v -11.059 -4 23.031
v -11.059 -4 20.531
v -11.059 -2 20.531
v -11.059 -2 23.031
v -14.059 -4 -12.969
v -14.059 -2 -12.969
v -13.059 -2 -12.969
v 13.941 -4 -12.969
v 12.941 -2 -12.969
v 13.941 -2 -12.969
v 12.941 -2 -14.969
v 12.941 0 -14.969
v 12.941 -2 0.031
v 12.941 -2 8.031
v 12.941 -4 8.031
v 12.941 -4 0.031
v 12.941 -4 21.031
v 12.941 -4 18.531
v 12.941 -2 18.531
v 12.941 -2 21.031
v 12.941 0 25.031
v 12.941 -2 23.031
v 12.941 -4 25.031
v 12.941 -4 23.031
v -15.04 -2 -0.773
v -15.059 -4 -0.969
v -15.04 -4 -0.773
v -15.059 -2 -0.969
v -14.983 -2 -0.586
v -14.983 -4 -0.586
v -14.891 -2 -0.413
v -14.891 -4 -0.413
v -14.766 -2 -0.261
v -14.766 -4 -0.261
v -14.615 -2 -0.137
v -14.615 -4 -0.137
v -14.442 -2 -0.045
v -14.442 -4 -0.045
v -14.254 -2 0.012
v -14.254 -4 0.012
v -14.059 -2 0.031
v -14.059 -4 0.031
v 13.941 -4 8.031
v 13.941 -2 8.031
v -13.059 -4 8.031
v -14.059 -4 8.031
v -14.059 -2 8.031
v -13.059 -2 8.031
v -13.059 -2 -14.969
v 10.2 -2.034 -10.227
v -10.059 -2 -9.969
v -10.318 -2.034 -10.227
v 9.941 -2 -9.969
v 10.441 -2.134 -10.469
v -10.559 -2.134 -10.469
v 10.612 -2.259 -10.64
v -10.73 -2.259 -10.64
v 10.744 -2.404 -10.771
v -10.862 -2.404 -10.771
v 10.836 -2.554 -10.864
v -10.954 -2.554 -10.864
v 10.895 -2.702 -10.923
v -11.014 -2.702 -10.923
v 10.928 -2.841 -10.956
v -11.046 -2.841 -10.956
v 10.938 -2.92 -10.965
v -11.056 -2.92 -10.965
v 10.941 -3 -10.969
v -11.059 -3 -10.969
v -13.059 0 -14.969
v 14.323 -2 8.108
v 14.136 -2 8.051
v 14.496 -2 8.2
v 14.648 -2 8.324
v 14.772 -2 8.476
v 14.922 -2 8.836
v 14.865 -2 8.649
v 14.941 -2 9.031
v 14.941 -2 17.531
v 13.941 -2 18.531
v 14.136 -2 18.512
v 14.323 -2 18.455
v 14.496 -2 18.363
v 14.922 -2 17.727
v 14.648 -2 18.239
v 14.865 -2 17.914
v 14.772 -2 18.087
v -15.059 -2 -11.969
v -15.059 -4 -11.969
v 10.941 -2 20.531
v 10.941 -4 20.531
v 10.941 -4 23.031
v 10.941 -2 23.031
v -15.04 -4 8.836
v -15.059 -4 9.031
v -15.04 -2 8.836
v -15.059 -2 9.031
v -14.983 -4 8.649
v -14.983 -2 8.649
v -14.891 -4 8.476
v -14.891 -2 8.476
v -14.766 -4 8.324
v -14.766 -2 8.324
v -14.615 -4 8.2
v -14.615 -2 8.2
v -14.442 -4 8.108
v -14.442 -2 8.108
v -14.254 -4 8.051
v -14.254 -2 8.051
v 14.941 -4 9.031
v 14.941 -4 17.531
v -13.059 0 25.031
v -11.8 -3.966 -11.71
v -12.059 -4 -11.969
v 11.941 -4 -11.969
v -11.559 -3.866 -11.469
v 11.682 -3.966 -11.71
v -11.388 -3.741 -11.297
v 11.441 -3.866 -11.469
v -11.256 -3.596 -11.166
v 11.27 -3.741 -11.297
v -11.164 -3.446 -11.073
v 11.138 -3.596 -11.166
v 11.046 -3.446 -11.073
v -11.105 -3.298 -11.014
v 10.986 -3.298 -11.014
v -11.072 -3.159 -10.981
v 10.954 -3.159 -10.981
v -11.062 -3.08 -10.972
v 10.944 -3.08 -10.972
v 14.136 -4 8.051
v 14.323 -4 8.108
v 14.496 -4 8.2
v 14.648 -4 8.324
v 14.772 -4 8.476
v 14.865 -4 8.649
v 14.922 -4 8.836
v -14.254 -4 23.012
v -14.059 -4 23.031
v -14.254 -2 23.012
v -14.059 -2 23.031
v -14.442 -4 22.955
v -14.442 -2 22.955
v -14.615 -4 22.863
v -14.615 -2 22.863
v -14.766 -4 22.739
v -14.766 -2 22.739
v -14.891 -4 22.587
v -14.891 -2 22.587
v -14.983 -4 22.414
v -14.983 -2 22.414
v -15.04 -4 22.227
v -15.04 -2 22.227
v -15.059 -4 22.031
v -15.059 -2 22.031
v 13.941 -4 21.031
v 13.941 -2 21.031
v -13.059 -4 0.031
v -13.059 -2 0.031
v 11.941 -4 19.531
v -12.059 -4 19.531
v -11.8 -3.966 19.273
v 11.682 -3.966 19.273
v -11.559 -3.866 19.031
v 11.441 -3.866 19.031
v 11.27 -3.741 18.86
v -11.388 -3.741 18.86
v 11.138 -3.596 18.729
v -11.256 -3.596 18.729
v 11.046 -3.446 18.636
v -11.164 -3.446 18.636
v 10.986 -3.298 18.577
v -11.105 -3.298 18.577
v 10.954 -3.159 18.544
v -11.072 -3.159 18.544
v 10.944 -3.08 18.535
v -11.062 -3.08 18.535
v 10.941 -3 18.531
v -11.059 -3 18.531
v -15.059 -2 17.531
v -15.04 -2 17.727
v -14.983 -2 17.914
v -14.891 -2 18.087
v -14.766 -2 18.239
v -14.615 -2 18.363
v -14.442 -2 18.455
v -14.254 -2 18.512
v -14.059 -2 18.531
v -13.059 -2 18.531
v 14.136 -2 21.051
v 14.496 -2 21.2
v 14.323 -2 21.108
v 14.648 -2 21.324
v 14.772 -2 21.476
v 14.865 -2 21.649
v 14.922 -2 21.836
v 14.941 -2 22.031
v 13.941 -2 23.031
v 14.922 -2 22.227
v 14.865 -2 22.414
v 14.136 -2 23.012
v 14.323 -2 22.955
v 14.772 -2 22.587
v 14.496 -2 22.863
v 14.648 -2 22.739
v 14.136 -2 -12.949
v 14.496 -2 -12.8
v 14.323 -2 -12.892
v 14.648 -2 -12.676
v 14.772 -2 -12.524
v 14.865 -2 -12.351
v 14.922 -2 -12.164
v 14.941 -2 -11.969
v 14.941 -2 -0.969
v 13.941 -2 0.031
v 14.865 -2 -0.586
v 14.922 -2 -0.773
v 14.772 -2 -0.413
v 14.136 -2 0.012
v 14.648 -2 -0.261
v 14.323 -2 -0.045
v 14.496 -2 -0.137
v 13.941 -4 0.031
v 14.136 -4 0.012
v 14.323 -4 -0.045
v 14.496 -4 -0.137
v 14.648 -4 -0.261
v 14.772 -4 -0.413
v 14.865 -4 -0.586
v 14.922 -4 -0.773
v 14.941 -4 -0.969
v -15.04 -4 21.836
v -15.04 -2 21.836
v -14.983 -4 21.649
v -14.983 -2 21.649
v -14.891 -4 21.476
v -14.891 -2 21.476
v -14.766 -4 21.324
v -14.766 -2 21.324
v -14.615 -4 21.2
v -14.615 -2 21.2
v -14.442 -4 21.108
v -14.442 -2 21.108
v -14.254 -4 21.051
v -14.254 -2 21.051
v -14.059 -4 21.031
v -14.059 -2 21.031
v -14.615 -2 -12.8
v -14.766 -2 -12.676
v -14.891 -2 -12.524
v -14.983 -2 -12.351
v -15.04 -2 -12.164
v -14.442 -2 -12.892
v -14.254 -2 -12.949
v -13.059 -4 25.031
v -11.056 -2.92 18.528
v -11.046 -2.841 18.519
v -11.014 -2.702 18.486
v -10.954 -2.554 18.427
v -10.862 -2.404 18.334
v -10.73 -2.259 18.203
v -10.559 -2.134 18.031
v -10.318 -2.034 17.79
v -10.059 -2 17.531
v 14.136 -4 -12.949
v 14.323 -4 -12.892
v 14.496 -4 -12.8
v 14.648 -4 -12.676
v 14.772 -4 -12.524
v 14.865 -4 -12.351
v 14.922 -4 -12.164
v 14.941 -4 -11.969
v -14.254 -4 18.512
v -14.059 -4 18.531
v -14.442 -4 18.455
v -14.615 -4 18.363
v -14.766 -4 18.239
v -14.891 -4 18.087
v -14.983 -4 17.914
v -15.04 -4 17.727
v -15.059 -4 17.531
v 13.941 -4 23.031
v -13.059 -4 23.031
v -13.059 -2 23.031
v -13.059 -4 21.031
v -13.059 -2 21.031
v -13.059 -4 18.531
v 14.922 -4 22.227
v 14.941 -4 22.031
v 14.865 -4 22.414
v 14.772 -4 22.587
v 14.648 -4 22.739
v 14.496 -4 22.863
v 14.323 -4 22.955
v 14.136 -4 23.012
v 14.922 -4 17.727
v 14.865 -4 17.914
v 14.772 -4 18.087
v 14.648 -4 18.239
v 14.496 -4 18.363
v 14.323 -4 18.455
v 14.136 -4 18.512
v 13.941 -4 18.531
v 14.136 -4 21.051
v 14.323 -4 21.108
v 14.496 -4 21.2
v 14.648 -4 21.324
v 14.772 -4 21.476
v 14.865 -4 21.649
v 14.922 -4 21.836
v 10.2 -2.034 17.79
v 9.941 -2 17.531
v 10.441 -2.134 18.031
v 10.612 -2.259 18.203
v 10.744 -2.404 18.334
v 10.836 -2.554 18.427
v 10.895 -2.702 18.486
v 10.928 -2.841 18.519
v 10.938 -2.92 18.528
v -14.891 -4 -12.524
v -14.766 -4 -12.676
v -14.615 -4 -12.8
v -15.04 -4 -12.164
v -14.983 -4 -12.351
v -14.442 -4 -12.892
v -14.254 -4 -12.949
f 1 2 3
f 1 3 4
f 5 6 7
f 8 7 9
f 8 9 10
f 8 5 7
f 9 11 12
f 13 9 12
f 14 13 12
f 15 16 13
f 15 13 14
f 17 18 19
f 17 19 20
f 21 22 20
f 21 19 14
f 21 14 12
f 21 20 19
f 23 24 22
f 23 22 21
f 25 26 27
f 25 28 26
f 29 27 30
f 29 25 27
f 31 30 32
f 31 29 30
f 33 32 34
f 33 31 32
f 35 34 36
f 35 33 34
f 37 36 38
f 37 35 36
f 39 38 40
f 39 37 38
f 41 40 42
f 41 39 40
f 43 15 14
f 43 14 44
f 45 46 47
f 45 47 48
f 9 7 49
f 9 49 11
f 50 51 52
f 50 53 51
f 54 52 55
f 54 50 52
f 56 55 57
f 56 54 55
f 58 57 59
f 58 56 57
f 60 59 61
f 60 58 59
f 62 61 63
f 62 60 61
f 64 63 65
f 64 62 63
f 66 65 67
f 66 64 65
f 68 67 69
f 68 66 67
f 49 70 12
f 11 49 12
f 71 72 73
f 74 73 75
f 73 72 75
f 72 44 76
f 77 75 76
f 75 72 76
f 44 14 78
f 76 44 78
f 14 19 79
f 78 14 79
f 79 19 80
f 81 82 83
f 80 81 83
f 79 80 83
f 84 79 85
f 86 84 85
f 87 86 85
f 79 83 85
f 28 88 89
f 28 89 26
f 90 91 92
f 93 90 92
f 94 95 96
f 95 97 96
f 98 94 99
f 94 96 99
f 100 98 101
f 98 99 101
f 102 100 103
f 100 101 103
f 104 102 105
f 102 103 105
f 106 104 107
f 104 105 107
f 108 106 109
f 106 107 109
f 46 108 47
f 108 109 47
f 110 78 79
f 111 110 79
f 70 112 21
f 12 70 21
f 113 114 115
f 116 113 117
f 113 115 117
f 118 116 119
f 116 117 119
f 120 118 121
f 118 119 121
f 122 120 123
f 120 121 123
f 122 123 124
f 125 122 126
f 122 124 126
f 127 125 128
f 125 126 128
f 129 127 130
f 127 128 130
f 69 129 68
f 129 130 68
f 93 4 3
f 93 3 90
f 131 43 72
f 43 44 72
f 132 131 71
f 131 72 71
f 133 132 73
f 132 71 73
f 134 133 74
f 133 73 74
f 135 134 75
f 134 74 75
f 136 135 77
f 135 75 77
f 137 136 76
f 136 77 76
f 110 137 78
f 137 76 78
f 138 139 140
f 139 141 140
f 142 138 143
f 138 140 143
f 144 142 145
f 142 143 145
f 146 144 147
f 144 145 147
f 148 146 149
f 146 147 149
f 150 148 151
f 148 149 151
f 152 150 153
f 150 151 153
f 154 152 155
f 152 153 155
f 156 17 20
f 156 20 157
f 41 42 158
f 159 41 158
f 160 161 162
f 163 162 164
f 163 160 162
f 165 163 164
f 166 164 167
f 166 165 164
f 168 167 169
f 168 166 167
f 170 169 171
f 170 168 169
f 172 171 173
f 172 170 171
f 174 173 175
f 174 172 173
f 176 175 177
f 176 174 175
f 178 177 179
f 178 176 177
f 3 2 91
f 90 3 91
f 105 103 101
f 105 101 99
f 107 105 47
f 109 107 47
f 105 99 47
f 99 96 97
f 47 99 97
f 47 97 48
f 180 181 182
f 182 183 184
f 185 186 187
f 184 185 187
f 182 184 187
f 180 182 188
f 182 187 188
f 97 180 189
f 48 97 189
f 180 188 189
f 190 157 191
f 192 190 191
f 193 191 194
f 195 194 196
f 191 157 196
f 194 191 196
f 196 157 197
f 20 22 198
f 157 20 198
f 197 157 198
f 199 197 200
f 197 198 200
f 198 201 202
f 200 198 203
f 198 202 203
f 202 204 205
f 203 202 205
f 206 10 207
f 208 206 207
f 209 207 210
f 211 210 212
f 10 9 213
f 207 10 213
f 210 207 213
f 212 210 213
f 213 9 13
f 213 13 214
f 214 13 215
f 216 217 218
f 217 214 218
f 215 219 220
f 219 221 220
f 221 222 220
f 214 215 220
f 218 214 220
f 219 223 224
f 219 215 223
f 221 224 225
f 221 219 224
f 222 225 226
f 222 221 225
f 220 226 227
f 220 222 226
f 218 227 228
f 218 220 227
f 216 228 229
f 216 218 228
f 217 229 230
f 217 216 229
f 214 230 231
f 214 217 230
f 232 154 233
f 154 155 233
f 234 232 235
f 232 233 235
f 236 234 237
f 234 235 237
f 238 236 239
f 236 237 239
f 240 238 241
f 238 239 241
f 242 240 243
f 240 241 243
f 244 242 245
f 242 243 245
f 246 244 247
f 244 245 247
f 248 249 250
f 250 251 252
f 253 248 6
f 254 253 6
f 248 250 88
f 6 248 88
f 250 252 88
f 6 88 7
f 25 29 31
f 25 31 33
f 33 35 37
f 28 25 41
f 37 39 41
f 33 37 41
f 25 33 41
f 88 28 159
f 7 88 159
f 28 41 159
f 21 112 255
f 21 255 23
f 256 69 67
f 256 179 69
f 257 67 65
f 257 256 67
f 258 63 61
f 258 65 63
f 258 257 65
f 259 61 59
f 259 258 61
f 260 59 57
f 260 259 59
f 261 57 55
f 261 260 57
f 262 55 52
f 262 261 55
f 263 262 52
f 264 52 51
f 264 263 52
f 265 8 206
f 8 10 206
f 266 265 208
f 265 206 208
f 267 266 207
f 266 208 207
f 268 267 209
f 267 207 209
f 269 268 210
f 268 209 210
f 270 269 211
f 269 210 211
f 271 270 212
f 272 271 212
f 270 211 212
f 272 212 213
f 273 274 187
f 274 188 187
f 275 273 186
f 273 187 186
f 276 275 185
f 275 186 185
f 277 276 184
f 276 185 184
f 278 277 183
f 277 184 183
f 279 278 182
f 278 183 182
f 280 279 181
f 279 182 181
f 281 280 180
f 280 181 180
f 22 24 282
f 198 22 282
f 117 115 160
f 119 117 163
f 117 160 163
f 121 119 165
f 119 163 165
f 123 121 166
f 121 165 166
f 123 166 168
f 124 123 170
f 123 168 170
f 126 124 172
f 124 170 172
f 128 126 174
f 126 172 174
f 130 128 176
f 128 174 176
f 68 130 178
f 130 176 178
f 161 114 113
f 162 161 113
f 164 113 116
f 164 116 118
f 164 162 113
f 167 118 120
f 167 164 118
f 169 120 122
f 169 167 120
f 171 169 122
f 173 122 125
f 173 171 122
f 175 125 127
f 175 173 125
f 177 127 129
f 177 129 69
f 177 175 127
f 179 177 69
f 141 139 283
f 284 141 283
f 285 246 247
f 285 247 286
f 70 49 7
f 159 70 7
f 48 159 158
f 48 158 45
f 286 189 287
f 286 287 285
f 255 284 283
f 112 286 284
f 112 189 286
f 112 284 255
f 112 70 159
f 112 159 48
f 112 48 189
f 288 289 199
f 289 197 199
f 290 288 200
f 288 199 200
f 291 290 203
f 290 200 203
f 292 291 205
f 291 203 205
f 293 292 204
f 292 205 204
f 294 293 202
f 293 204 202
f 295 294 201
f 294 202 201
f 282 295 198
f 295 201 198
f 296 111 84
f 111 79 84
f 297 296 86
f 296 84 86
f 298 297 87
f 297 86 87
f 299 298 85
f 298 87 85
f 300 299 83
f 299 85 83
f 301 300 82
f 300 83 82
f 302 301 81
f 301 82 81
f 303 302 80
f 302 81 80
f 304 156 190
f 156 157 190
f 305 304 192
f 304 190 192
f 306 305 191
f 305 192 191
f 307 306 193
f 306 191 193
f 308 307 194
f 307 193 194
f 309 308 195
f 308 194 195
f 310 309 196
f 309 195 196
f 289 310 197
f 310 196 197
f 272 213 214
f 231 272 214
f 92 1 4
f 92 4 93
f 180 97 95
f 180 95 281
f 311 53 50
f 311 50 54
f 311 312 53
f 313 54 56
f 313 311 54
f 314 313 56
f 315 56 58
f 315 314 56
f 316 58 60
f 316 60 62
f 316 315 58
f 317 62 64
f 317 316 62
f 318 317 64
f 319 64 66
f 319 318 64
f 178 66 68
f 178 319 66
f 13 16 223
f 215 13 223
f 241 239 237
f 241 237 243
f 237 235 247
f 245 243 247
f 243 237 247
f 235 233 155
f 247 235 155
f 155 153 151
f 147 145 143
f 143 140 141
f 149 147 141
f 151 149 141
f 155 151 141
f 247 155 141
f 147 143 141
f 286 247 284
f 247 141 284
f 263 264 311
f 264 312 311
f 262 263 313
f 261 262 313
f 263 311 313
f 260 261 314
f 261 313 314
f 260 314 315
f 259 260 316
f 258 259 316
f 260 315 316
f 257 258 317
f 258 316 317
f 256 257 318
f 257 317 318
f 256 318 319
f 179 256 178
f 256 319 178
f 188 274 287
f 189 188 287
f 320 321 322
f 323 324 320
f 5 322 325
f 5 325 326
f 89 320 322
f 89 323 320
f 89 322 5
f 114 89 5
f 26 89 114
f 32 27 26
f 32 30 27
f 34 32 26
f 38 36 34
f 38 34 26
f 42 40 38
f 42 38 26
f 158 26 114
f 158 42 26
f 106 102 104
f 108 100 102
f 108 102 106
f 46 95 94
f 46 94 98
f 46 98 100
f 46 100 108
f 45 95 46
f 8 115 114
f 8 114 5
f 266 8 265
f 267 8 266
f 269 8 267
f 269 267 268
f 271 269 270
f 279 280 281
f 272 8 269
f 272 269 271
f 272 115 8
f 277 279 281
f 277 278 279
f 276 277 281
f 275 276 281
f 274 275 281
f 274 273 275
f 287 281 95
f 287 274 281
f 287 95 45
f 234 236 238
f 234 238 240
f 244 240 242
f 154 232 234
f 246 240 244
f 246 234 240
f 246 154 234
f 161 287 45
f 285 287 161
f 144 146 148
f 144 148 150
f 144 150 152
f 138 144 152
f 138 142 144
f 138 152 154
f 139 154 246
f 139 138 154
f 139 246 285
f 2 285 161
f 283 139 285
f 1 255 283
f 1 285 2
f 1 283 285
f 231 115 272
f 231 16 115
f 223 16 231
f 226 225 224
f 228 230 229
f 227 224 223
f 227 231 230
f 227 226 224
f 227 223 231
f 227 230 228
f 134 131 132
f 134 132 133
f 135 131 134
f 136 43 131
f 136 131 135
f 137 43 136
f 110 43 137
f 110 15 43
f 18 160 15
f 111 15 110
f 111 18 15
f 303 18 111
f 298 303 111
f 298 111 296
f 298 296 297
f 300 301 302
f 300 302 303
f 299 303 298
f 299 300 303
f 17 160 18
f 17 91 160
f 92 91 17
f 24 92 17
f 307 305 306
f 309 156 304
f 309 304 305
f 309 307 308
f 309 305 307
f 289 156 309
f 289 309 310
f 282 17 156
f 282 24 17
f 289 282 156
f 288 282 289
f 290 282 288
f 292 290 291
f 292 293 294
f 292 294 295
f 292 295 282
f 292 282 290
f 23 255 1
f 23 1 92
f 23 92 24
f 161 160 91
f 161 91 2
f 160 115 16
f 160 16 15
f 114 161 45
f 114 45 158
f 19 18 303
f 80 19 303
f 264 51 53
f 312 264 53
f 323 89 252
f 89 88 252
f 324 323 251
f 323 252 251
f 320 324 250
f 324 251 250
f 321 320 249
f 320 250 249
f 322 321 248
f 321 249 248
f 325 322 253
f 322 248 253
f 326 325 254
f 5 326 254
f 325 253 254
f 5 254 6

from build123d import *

# Parameters (mm, degrees)
F0_W     = 26
F0_H     = 40
F1_DEPTH = 2
F2_W     = 30
F2_H     = 40
F3_DEPTH = 2
F4_W     = 2
F4_H     = 2
F4_H_2   = 2.5
F4_W_2   = 30
F4_W_3   = 22
F4_H_3   = 8
F4_H_4   = 29.5
F5_DEPTH = 2
F6_R     = 0.99999


# Not quite as in the source:
# - a fillet or chamfer is up to 0.001 mm smaller than in the source, because OpenCascade refuses the exact size


with BuildPart() as f1:
    # F0 (on Front) → F1 (new body)
    with BuildSketch(Plane.XZ):
        with Locations((-0.059209764, 5.0314570961)):
            Rectangle(F0_W, F0_H)
    extrude(amount=F1_DEPTH)

    # F2 (on face) → F3 (join)
    with BuildSketch(Plane.XZ.offset(2)):
        with Locations((-0.059209764, 5.0314570961)):
            Rectangle(F2_W, F2_H)
    extrude(amount=F3_DEPTH)

    # F4 (on face) → F5 (cut)
    with BuildSketch(Plane.XZ.offset(4)):
        with Locations((-14.059209764, 24.0314570961)):
            Rectangle(F4_W, F4_H)
        with Locations((13.940790236, 24.0314570961)):
            Rectangle(F4_W, F4_H)
        with Locations((-14.059209764, 19.7814570961)):
            Rectangle(F4_W, F4_H_2)
        with Locations((13.940790236, 19.7814570961)):
            Rectangle(F4_W, F4_H_2)
        with Locations((-0.059209764, -13.9685429039)):
            Rectangle(F4_W_2, F4_H)
        with Locations((-0.059209764, 21.7814570961)):
            Rectangle(F4_W_3, F4_H_2)
        with Locations((-14.059209764, 4.0314570961)):
            Rectangle(F4_W, F4_H_3)
        with Locations((13.940790236, 4.0314570961)):
            Rectangle(F4_W, F4_H_3)
        with Locations((-0.059209764, 3.7814570961)):
            Rectangle(F4_W_3, F4_H_4)
    extrude(amount=-F5_DEPTH, mode=Mode.SUBTRACT)

    # F6 (radius 1 in the source; OpenCascade refuses exactly that, so slightly less here)
    f6_edges = [f1.edges().sort_by_distance(p)[0] for p in [
        (14.94079, -3, 23.031457),
        (14.94079, -3, 21.031457),
        (14.94079, -3, 18.531457),
        (14.94079, -3, -12.968543),
        (-15.05921, -3, -12.968543),
        (-15.05921, -3, 18.531457),
        (-15.05921, -3, 23.031457),
        (-15.05921, -3, 21.031457),
        (-15.05921, -3, 8.031457),
        (-15.05921, -3, 0.031457),
        (14.94079, -3, 8.031457),
        (14.94079, -3, 0.031457),
        (-0.05921, -2, -10.968543),
        (10.94079, -2, 3.781457),
        (-0.05921, -2, 18.531457),
        (-11.05921, -2, 3.781457),
        (-0.05921, -4, 18.531457),
        (-11.05921, -4, 3.781457),
        (-0.05921, -4, -10.968543),
        (10.94079, -4, 3.781457),
    ]]
    fillet(f6_edges, radius=F6_R)


solid = f1.part
